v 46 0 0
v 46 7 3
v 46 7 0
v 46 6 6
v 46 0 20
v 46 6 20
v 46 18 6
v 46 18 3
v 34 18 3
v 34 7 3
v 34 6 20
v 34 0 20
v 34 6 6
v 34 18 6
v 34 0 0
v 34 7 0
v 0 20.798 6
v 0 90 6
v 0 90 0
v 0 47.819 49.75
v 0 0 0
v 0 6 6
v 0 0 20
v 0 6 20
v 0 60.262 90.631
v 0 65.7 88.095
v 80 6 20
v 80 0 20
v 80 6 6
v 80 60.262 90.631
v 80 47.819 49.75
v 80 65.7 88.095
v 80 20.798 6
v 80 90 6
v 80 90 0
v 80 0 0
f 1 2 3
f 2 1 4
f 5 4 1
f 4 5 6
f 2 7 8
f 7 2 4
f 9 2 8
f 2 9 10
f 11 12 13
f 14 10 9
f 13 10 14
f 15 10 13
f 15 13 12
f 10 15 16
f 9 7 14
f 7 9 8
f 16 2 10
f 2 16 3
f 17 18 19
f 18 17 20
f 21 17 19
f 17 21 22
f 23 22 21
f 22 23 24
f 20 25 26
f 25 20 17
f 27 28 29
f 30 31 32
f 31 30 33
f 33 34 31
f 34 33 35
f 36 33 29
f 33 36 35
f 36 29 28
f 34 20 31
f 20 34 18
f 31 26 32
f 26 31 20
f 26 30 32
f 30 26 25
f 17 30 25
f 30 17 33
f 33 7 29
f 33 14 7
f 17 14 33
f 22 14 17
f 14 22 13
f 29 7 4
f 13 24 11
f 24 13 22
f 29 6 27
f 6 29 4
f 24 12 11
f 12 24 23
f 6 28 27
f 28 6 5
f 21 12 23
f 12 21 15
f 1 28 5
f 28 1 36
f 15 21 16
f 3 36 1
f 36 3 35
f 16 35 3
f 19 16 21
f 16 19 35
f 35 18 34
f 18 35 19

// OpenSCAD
// Parametric phone stand: a base, a back rest tilted back at `angle`, a support wedge,
// a front lip that holds the phone, and a cable slot. All sizes in mm.
// Built as one side profile (Y = front to back, Z = up) extruded across the width.

width       = 80;    // [50:140] stand width
depth       = 90;    // [60:140] base depth, front to back
angle       = 65;    // [50:80] back rest angle from horizontal, degrees
rest_length = 100;   // [60:160] length of the back rest
thickness   = 6;     // [4:12] plate thickness
phone_depth = 12;    // [6:20] gap between lip and back rest (phone + case)
lip_height  = 14;    // [6:25] lip height above the base
cable_slot  = 12;    // [0:20] cable slot width, 0 for none

foot = thickness + phone_depth;              // where the back rest meets the base
dir  = [cos(angle), sin(angle)];             // up the back rest
nrm  = [sin(angle), -cos(angle)];            // through the back rest, towards the back
top  = [foot, 0] + rest_length * dir;

assert(top[0] + thickness < depth, "back rest overhangs the base: raise depth or angle");

module profile() {
    square([depth, thickness]);                                   // base
    square([thickness, thickness + lip_height]);                  // front lip
    polygon([[foot, 0], top, top + thickness * nrm,               // back rest
             [foot + thickness / sin(angle), 0]]);
    s = [foot, 0] + 0.6 * rest_length * dir;                      // support wedge
    polygon([[foot, 0], s, [depth, thickness], [depth, 0]]);
}

difference() {
    rotate([90, 0, 90]) linear_extrude(width) profile();
    if (cable_slot > 0) {
        translate([(width - cable_slot) / 2, -1, thickness / 2])  // groove in the base
            cube([cable_slot, foot + 1, thickness]);
        translate([(width - cable_slot) / 2, -1, -1])             // cut through the lip
            cube([cable_slot, thickness + 2, lip_height + thickness + 2]);
    }
}
